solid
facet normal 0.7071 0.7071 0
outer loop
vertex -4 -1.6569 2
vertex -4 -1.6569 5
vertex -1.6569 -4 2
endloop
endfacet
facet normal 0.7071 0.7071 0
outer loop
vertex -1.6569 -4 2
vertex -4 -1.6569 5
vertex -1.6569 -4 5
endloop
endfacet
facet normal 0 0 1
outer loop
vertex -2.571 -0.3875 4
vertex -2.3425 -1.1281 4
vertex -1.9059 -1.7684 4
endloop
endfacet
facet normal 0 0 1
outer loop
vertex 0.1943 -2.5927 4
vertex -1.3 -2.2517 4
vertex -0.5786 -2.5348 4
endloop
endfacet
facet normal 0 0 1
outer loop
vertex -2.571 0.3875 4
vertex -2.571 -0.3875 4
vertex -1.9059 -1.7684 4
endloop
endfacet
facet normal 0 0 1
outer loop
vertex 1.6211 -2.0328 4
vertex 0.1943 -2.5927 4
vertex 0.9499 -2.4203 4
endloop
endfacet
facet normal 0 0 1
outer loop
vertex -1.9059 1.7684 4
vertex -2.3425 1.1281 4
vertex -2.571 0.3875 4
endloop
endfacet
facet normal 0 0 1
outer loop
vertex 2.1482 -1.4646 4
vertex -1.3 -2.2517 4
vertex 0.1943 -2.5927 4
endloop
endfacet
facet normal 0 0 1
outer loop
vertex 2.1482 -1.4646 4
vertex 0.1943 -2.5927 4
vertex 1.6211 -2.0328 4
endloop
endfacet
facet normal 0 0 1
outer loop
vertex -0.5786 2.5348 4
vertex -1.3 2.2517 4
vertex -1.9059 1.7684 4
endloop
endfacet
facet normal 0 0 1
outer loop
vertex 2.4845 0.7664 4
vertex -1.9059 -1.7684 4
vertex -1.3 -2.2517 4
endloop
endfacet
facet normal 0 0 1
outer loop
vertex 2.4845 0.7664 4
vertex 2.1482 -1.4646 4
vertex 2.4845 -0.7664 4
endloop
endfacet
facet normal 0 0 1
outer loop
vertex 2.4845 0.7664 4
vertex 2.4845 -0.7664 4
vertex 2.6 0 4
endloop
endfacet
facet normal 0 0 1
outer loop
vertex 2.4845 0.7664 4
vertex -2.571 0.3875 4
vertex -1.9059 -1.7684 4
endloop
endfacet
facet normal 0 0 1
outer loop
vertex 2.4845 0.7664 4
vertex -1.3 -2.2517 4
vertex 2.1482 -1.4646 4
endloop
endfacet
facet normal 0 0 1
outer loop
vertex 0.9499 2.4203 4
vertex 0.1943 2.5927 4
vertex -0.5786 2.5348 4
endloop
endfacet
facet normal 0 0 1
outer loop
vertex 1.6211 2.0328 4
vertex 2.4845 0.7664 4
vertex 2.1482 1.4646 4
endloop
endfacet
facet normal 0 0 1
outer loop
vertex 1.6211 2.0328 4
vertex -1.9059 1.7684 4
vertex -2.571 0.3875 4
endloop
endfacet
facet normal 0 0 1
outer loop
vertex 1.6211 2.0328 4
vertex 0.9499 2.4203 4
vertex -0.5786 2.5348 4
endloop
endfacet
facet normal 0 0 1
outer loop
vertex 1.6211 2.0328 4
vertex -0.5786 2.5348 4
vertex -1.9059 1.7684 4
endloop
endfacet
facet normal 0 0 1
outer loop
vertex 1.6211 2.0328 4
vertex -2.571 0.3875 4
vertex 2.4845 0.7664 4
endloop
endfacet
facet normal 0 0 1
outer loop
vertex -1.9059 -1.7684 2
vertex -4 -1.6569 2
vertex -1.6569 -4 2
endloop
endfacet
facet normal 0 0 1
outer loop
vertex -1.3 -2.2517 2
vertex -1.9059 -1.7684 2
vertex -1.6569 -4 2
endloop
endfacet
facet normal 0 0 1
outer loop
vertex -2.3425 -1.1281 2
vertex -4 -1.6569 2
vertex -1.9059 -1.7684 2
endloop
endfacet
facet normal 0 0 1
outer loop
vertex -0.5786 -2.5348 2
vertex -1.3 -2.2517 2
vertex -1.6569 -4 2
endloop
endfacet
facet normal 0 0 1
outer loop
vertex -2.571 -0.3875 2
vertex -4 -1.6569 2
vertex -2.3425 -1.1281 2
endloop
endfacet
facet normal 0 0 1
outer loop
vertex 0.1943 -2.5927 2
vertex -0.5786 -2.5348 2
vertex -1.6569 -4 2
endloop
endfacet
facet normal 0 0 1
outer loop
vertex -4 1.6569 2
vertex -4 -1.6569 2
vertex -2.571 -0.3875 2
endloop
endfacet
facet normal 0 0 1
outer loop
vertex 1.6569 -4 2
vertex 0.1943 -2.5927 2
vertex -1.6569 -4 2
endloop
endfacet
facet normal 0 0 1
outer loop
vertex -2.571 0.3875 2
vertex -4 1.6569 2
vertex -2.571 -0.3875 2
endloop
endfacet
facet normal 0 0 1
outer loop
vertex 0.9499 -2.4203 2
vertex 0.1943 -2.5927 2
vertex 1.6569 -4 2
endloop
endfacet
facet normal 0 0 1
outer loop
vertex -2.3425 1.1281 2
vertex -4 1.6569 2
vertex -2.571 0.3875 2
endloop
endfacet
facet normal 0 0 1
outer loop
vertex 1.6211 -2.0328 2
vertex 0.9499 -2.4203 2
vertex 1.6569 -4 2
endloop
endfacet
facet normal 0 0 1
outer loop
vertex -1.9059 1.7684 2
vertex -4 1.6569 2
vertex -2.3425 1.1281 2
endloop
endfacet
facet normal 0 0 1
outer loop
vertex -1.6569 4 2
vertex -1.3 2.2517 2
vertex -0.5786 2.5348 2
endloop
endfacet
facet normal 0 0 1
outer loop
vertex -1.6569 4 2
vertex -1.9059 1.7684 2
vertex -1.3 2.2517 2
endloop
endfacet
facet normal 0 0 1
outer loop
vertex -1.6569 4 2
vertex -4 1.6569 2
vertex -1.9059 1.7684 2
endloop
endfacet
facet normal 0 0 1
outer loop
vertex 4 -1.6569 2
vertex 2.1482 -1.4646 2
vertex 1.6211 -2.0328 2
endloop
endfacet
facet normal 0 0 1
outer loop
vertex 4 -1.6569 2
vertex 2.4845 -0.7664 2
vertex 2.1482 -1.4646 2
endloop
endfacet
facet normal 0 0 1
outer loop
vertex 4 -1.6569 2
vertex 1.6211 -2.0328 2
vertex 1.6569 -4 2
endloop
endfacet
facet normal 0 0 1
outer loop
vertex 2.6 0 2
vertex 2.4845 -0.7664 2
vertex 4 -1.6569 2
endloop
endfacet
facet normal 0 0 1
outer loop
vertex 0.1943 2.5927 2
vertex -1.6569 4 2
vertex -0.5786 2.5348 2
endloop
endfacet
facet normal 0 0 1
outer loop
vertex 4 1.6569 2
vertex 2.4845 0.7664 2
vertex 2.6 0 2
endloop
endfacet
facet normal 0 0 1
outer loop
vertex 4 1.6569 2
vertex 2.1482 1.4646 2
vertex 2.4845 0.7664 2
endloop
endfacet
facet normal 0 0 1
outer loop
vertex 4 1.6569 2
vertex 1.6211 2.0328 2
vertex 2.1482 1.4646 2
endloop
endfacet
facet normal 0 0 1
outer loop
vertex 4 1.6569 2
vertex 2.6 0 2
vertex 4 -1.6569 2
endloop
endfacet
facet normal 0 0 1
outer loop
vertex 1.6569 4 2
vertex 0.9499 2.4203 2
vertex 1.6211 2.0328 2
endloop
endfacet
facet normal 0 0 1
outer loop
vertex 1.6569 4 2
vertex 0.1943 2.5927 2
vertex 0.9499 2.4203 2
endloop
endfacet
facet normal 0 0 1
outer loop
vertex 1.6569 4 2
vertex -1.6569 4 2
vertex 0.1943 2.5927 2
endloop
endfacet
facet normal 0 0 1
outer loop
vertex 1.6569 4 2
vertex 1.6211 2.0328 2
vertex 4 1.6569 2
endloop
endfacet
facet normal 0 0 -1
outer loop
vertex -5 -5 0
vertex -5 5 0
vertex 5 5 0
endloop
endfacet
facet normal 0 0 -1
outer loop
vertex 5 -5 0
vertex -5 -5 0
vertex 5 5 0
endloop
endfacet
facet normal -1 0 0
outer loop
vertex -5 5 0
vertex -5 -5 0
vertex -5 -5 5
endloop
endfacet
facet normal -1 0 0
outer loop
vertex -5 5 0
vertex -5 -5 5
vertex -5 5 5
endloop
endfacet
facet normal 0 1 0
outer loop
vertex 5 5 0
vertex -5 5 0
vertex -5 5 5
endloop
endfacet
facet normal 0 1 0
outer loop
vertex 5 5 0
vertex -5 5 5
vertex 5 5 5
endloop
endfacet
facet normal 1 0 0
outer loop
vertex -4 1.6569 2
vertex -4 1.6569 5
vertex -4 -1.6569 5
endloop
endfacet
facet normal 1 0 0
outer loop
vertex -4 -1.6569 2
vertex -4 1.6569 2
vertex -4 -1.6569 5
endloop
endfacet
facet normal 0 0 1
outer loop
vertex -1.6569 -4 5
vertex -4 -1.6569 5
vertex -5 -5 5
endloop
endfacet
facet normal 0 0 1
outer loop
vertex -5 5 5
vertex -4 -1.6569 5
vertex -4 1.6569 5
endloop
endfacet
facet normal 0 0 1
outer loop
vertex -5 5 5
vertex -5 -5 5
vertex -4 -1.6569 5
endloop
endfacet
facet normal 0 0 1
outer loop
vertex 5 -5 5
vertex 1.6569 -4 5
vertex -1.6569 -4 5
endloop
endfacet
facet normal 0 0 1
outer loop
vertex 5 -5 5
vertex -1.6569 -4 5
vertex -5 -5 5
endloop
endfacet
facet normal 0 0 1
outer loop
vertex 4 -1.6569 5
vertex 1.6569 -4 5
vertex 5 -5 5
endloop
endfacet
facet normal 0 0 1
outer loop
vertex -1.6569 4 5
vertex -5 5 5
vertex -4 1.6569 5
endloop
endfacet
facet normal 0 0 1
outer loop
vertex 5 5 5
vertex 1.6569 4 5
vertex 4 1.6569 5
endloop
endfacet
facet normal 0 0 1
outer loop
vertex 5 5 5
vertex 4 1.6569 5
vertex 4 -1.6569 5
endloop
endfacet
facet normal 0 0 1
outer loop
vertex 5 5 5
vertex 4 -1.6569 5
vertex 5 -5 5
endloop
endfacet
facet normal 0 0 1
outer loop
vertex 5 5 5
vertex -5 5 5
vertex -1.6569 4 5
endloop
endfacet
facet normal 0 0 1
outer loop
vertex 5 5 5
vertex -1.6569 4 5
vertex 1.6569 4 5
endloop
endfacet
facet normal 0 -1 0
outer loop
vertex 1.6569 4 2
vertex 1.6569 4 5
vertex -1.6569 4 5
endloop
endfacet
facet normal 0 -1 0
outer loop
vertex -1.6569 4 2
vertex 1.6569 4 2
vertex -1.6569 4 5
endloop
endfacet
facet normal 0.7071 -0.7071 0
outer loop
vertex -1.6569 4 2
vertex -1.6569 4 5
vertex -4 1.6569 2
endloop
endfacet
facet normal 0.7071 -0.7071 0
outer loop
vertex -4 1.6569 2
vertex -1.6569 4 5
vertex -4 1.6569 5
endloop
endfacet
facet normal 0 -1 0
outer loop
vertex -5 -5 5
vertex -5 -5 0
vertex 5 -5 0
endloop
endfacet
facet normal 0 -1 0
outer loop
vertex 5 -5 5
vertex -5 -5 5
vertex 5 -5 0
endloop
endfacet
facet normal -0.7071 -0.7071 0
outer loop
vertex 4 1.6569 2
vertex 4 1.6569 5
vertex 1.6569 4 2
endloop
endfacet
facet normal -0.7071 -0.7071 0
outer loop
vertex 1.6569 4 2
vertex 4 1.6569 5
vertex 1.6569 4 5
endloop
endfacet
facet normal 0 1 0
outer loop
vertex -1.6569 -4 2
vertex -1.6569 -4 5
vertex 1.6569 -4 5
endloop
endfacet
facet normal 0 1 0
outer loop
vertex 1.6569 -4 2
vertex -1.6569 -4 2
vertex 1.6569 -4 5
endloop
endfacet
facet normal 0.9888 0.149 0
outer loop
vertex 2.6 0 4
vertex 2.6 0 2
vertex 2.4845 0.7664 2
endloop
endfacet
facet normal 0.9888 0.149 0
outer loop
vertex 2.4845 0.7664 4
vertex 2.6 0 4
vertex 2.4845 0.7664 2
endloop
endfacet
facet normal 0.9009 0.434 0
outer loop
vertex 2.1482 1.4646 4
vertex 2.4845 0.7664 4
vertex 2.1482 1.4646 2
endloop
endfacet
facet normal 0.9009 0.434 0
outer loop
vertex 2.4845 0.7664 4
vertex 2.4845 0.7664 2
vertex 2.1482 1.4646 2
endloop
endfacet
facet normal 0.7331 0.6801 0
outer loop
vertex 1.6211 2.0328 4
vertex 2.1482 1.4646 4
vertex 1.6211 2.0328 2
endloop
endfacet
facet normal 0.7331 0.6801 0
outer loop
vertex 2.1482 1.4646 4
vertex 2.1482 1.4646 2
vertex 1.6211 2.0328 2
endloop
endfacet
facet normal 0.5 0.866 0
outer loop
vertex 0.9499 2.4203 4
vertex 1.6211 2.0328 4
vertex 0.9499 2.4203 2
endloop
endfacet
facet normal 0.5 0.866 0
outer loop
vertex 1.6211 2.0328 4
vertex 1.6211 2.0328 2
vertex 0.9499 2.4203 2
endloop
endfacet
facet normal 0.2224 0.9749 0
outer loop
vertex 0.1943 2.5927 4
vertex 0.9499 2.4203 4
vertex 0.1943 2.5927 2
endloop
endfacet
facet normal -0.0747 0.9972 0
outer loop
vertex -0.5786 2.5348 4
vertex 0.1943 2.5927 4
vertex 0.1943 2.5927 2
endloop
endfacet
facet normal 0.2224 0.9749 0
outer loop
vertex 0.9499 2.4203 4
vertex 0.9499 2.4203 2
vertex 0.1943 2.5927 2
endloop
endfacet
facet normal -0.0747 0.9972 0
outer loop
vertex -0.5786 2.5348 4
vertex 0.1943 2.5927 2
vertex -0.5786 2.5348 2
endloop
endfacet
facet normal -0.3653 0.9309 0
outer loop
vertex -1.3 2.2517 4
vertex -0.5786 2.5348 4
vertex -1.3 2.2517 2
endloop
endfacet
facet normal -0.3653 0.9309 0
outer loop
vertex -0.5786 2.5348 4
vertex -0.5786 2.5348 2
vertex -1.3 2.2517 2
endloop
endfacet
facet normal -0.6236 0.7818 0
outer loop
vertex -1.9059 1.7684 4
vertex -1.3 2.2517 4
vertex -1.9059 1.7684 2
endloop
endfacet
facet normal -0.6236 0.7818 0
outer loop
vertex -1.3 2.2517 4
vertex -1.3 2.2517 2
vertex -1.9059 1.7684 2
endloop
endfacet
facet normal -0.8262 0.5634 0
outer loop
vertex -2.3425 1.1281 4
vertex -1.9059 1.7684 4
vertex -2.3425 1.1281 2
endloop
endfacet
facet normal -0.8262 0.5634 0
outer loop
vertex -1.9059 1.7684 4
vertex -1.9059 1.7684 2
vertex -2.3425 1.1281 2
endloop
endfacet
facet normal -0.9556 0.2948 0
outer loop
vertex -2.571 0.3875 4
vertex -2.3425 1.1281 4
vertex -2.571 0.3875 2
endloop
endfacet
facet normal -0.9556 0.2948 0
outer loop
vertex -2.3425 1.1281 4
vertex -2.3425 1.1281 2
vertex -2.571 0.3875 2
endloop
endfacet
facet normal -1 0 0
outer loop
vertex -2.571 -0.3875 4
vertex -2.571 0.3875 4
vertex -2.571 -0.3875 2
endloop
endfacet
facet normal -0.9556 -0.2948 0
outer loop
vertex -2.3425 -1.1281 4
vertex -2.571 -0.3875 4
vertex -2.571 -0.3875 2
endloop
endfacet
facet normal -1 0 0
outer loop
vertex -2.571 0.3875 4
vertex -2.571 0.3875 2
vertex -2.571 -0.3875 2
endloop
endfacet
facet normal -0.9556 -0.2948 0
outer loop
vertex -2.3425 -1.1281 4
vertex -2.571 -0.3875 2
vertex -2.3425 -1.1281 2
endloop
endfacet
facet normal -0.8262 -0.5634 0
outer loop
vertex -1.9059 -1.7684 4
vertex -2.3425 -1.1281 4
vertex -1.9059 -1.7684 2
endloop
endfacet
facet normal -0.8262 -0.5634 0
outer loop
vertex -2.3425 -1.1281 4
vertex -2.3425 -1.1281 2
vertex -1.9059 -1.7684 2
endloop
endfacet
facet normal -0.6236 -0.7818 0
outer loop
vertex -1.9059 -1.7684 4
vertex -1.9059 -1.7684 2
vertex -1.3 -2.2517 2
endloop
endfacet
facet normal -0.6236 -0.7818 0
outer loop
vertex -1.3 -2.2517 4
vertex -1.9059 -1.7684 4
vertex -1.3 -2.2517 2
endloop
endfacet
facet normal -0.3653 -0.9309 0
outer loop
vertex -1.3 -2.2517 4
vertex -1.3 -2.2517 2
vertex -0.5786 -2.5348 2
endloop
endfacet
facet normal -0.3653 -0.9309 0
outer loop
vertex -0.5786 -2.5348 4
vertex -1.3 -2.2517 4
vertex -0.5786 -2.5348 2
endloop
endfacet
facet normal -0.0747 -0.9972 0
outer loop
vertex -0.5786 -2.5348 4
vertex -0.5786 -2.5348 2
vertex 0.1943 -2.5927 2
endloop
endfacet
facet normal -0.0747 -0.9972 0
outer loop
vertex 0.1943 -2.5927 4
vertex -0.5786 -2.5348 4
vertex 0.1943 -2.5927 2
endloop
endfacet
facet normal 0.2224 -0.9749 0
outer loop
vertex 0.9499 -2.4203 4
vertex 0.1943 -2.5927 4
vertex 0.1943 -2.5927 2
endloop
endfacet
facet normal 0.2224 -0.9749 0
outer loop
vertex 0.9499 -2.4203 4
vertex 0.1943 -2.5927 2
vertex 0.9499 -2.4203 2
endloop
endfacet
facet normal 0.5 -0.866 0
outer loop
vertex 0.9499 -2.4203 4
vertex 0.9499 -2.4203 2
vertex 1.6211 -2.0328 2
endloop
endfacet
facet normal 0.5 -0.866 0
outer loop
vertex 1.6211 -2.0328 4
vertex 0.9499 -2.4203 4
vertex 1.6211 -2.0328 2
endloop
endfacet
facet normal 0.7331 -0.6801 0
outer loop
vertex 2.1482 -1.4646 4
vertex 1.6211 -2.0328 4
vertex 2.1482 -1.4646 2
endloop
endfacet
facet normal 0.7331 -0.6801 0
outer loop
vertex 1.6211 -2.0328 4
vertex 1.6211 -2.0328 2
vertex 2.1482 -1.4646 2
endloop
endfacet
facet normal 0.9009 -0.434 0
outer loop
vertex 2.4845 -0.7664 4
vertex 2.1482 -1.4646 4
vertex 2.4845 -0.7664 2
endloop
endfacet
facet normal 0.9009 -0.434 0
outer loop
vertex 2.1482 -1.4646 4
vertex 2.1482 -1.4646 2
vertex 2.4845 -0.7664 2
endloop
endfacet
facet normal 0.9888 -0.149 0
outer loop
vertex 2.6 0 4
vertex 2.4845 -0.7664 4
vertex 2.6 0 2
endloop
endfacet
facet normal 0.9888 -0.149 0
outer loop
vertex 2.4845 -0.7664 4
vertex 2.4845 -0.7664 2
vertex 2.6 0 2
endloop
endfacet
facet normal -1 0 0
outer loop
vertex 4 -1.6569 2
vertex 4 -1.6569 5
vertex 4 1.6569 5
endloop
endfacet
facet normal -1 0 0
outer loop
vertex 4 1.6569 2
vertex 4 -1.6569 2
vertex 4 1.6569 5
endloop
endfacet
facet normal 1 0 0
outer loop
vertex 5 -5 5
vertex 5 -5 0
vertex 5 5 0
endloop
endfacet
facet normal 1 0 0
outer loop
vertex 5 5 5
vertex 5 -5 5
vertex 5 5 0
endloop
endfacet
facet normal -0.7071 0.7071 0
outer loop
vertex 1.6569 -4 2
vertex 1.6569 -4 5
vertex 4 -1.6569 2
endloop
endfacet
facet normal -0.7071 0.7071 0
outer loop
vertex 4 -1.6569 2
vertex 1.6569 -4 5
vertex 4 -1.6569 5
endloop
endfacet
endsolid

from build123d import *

# Parameters (mm, degrees)
F0_W     = 10
F0_H     = 10
F1_DEPTH = 5
F3_DEPTH = 3
F4_R     = 2.6
F5_DEPTH = 2


with BuildPart() as f1:
    # F0 (on Top) → F1 (new body)
    with BuildSketch(Plane.XY):
        Rectangle(F0_W, F0_H)
    extrude(amount=F1_DEPTH)

    # F2 (on face) → F3 (cut)
    with BuildSketch(Plane.XY.offset(5)):
        Polygon((-4, 1.656854), (-4, -1.656854), (-1.656854, -4), (1.656854, -4), (4, -1.656854), (4, 1.656854), (1.656854, 4), (-1.656854, 4), align=None)
    extrude(amount=-F3_DEPTH, mode=Mode.SUBTRACT)

    # F4 (on face) → F5 (join)
    with BuildSketch(Plane.XY.offset(2)):
        Circle(F4_R)
    extrude(amount=F5_DEPTH)


solid = f1.part
